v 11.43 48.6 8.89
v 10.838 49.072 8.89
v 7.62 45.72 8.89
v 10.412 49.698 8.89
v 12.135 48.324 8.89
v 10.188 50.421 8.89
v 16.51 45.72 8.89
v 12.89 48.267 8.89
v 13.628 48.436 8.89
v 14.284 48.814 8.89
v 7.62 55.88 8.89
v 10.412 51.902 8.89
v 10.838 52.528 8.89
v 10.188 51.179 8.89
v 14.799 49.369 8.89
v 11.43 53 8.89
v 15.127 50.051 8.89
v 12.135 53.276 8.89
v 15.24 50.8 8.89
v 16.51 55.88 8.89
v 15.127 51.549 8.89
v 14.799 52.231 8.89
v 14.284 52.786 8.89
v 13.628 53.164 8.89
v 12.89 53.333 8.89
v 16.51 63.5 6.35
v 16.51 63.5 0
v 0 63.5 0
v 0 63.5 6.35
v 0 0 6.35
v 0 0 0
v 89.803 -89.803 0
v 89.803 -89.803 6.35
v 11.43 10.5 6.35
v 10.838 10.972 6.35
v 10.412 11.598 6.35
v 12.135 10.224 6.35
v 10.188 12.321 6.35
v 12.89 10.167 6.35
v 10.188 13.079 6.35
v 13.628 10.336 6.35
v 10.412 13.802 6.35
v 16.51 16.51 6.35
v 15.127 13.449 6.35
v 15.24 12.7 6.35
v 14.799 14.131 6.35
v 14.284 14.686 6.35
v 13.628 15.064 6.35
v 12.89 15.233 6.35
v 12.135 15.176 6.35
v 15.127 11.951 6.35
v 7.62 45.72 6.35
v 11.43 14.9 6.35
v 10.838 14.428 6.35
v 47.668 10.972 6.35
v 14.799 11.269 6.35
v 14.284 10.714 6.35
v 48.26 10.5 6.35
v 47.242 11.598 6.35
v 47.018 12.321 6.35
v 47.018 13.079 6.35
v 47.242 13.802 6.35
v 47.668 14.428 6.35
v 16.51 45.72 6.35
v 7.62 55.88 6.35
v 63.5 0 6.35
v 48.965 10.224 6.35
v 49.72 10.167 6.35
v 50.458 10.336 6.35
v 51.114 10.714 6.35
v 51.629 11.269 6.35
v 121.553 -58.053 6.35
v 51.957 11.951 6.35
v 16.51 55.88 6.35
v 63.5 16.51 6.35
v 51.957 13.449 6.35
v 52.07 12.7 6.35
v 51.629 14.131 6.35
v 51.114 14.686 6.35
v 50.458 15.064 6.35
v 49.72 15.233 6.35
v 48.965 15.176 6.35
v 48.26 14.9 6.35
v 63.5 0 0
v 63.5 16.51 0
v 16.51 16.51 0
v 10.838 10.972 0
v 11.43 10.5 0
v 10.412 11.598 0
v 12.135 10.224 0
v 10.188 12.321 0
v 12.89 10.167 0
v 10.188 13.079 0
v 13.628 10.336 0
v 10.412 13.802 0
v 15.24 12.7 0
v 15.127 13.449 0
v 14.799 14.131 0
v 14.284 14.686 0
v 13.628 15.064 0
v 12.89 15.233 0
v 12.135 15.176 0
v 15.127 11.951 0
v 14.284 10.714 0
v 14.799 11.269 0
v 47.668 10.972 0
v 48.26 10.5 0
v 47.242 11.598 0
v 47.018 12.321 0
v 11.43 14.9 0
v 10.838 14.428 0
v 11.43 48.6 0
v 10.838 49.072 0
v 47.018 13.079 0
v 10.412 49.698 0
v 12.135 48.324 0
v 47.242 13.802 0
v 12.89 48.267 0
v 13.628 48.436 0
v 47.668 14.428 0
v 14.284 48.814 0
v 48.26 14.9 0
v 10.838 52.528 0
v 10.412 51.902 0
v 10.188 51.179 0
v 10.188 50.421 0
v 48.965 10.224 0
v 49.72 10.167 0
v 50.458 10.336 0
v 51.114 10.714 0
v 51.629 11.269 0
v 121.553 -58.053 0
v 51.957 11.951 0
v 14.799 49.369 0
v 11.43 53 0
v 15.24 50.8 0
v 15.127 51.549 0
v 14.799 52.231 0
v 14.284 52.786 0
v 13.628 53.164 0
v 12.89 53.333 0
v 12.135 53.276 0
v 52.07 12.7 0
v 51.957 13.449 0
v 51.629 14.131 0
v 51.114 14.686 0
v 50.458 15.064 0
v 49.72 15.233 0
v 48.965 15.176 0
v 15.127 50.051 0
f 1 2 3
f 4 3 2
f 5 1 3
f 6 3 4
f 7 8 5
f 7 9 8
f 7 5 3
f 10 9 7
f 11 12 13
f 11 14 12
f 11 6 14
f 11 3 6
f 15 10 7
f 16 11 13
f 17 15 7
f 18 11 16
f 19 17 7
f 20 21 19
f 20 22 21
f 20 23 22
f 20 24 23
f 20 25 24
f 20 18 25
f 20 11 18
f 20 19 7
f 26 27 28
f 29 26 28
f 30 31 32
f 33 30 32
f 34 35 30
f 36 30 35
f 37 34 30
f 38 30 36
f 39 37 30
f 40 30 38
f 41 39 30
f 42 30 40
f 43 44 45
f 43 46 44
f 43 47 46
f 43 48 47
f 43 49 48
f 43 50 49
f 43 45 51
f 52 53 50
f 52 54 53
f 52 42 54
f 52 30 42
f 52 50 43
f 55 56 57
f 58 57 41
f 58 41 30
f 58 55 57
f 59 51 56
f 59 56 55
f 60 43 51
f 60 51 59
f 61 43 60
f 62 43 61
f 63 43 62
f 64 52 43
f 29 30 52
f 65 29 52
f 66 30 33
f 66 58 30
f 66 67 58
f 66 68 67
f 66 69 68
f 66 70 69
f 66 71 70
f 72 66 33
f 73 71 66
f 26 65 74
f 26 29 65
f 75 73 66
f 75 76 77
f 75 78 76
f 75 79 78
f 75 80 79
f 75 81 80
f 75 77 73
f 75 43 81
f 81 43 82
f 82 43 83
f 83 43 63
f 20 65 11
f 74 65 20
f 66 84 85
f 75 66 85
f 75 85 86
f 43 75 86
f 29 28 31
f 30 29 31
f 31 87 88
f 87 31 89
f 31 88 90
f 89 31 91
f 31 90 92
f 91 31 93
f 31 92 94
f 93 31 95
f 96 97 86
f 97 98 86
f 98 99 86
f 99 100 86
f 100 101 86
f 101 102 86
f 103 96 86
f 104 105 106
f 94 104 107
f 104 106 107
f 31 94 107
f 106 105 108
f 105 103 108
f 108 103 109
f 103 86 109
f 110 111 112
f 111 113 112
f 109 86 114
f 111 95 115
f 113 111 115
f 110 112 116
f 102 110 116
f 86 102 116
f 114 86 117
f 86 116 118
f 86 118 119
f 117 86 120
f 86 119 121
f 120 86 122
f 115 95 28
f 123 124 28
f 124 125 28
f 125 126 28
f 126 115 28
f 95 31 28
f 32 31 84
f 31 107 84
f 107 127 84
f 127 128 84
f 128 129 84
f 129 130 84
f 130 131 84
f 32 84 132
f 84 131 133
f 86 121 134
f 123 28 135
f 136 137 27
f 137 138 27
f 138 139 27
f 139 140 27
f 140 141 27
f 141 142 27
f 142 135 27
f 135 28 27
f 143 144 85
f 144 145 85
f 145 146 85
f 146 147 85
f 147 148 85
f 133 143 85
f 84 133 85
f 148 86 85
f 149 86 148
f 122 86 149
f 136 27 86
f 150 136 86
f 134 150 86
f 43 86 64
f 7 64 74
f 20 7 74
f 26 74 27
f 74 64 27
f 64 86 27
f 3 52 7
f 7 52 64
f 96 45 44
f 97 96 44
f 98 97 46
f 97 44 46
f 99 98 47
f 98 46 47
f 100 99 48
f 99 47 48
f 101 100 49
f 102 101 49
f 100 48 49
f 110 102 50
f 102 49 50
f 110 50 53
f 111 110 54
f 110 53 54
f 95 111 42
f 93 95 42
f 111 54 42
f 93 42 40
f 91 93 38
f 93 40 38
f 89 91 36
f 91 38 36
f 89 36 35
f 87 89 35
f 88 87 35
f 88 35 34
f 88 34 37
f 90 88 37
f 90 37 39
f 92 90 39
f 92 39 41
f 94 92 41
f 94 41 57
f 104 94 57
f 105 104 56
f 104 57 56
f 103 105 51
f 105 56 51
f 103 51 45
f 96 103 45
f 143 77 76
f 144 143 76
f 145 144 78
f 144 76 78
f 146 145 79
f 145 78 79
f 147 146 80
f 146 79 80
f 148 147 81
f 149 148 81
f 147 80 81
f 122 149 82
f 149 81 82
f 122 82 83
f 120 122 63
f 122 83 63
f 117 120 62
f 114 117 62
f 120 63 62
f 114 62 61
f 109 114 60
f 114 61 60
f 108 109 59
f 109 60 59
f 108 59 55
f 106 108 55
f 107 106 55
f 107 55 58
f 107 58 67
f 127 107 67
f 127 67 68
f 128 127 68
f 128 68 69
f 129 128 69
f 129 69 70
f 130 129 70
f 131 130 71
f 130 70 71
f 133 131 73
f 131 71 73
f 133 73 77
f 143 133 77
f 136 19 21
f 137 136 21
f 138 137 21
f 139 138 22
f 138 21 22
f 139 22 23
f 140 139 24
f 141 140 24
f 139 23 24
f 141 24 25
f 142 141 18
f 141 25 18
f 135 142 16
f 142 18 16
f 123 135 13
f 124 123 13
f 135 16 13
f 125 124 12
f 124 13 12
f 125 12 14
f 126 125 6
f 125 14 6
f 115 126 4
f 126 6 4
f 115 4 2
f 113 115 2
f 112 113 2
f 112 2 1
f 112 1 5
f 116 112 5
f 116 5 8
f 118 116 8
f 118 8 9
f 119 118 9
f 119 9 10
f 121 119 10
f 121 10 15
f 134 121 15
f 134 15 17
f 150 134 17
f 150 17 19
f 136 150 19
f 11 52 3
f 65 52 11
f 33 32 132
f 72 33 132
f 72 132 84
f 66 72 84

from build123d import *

# Parameters (mm, degrees)
F1_DEPTH = 6.35
F2_R     = 2.54
F3_DEPTH = 6.35
F4_W     = 8.89
F4_H     = 10.16
F5_DEPTH = 2.54
F6_R     = 2.54
F7_DEPTH = 25.4


with BuildPart() as f1:
    # F0 (on Top) → F1 (new body)
    with BuildSketch(Plane.XY):
        Polygon((0, 63.5), (0, 0), (89.802561, -89.802561), (121.552561, -58.052561), (63.5, 0), (63.5, 16.51), (16.51, 16.51), (16.51, 63.5), align=None)
    extrude(amount=F1_DEPTH)

    # F2 (on face) → F3 (cut)
    with BuildSketch(Plane.XY.offset(6.35)):
        with Locations((12.7, 50.8)):
            Circle(F2_R)
        with Locations((49.53, 12.7)):
            Circle(F2_R)
        with Locations((12.7, 12.7)):
            Circle(F2_R)
    extrude(amount=-F3_DEPTH, mode=Mode.SUBTRACT)

    # F4 (on face) → F5 (join)
    with BuildSketch(Plane.XY.offset(6.35)):
        with Locations((12.065, 50.8)):
            Rectangle(F4_W, F4_H)
    extrude(amount=F5_DEPTH)

    # F6 (on face) → F7 (cut)
    with BuildSketch(Plane.XY.offset(8.89)):
        with Locations((12.7, 50.8)):
            Circle(F6_R)
    extrude(amount=-F7_DEPTH, mode=Mode.SUBTRACT)


solid = f1.part
